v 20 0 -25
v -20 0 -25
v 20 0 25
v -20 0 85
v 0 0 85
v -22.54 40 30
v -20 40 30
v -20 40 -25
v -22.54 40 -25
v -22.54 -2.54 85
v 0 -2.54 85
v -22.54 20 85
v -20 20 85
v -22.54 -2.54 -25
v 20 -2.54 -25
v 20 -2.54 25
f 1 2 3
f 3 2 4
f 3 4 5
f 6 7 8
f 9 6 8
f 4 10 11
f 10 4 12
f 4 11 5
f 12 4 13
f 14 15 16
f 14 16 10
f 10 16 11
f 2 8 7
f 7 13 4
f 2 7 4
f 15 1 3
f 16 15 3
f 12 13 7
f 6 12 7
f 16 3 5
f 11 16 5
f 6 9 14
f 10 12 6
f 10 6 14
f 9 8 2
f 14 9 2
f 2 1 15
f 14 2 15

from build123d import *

# Parameters (mm, degrees)
F1_DEPTH = 2.54
F2_W     = 2.54
F2_H     = 110
F3_DEPTH = 2.54


with BuildPart() as f1:
    # F0 (on Front) → F1 (new body)
    with BuildSketch(Plane.XZ):
        Polygon((-20, -25), (20, -25), (20, 25), (0, 85), (-20, 85), (-20, 25), align=None)
    extrude(amount=F1_DEPTH)

    # F2 (on face) → F3 (join)
    with BuildSketch(Plane(origin=(-20, 0, 0), x_dir=(0, -1, 0), z_dir=(-1, 0, 0))):
        Polygon((-40, -25), (0, -25), (0, 85), (-20, 85), (-40, 30), align=None)
        with Locations((1.27, 30)):
            Rectangle(F2_W, F2_H)
    extrude(amount=F3_DEPTH)


solid = f1.part
